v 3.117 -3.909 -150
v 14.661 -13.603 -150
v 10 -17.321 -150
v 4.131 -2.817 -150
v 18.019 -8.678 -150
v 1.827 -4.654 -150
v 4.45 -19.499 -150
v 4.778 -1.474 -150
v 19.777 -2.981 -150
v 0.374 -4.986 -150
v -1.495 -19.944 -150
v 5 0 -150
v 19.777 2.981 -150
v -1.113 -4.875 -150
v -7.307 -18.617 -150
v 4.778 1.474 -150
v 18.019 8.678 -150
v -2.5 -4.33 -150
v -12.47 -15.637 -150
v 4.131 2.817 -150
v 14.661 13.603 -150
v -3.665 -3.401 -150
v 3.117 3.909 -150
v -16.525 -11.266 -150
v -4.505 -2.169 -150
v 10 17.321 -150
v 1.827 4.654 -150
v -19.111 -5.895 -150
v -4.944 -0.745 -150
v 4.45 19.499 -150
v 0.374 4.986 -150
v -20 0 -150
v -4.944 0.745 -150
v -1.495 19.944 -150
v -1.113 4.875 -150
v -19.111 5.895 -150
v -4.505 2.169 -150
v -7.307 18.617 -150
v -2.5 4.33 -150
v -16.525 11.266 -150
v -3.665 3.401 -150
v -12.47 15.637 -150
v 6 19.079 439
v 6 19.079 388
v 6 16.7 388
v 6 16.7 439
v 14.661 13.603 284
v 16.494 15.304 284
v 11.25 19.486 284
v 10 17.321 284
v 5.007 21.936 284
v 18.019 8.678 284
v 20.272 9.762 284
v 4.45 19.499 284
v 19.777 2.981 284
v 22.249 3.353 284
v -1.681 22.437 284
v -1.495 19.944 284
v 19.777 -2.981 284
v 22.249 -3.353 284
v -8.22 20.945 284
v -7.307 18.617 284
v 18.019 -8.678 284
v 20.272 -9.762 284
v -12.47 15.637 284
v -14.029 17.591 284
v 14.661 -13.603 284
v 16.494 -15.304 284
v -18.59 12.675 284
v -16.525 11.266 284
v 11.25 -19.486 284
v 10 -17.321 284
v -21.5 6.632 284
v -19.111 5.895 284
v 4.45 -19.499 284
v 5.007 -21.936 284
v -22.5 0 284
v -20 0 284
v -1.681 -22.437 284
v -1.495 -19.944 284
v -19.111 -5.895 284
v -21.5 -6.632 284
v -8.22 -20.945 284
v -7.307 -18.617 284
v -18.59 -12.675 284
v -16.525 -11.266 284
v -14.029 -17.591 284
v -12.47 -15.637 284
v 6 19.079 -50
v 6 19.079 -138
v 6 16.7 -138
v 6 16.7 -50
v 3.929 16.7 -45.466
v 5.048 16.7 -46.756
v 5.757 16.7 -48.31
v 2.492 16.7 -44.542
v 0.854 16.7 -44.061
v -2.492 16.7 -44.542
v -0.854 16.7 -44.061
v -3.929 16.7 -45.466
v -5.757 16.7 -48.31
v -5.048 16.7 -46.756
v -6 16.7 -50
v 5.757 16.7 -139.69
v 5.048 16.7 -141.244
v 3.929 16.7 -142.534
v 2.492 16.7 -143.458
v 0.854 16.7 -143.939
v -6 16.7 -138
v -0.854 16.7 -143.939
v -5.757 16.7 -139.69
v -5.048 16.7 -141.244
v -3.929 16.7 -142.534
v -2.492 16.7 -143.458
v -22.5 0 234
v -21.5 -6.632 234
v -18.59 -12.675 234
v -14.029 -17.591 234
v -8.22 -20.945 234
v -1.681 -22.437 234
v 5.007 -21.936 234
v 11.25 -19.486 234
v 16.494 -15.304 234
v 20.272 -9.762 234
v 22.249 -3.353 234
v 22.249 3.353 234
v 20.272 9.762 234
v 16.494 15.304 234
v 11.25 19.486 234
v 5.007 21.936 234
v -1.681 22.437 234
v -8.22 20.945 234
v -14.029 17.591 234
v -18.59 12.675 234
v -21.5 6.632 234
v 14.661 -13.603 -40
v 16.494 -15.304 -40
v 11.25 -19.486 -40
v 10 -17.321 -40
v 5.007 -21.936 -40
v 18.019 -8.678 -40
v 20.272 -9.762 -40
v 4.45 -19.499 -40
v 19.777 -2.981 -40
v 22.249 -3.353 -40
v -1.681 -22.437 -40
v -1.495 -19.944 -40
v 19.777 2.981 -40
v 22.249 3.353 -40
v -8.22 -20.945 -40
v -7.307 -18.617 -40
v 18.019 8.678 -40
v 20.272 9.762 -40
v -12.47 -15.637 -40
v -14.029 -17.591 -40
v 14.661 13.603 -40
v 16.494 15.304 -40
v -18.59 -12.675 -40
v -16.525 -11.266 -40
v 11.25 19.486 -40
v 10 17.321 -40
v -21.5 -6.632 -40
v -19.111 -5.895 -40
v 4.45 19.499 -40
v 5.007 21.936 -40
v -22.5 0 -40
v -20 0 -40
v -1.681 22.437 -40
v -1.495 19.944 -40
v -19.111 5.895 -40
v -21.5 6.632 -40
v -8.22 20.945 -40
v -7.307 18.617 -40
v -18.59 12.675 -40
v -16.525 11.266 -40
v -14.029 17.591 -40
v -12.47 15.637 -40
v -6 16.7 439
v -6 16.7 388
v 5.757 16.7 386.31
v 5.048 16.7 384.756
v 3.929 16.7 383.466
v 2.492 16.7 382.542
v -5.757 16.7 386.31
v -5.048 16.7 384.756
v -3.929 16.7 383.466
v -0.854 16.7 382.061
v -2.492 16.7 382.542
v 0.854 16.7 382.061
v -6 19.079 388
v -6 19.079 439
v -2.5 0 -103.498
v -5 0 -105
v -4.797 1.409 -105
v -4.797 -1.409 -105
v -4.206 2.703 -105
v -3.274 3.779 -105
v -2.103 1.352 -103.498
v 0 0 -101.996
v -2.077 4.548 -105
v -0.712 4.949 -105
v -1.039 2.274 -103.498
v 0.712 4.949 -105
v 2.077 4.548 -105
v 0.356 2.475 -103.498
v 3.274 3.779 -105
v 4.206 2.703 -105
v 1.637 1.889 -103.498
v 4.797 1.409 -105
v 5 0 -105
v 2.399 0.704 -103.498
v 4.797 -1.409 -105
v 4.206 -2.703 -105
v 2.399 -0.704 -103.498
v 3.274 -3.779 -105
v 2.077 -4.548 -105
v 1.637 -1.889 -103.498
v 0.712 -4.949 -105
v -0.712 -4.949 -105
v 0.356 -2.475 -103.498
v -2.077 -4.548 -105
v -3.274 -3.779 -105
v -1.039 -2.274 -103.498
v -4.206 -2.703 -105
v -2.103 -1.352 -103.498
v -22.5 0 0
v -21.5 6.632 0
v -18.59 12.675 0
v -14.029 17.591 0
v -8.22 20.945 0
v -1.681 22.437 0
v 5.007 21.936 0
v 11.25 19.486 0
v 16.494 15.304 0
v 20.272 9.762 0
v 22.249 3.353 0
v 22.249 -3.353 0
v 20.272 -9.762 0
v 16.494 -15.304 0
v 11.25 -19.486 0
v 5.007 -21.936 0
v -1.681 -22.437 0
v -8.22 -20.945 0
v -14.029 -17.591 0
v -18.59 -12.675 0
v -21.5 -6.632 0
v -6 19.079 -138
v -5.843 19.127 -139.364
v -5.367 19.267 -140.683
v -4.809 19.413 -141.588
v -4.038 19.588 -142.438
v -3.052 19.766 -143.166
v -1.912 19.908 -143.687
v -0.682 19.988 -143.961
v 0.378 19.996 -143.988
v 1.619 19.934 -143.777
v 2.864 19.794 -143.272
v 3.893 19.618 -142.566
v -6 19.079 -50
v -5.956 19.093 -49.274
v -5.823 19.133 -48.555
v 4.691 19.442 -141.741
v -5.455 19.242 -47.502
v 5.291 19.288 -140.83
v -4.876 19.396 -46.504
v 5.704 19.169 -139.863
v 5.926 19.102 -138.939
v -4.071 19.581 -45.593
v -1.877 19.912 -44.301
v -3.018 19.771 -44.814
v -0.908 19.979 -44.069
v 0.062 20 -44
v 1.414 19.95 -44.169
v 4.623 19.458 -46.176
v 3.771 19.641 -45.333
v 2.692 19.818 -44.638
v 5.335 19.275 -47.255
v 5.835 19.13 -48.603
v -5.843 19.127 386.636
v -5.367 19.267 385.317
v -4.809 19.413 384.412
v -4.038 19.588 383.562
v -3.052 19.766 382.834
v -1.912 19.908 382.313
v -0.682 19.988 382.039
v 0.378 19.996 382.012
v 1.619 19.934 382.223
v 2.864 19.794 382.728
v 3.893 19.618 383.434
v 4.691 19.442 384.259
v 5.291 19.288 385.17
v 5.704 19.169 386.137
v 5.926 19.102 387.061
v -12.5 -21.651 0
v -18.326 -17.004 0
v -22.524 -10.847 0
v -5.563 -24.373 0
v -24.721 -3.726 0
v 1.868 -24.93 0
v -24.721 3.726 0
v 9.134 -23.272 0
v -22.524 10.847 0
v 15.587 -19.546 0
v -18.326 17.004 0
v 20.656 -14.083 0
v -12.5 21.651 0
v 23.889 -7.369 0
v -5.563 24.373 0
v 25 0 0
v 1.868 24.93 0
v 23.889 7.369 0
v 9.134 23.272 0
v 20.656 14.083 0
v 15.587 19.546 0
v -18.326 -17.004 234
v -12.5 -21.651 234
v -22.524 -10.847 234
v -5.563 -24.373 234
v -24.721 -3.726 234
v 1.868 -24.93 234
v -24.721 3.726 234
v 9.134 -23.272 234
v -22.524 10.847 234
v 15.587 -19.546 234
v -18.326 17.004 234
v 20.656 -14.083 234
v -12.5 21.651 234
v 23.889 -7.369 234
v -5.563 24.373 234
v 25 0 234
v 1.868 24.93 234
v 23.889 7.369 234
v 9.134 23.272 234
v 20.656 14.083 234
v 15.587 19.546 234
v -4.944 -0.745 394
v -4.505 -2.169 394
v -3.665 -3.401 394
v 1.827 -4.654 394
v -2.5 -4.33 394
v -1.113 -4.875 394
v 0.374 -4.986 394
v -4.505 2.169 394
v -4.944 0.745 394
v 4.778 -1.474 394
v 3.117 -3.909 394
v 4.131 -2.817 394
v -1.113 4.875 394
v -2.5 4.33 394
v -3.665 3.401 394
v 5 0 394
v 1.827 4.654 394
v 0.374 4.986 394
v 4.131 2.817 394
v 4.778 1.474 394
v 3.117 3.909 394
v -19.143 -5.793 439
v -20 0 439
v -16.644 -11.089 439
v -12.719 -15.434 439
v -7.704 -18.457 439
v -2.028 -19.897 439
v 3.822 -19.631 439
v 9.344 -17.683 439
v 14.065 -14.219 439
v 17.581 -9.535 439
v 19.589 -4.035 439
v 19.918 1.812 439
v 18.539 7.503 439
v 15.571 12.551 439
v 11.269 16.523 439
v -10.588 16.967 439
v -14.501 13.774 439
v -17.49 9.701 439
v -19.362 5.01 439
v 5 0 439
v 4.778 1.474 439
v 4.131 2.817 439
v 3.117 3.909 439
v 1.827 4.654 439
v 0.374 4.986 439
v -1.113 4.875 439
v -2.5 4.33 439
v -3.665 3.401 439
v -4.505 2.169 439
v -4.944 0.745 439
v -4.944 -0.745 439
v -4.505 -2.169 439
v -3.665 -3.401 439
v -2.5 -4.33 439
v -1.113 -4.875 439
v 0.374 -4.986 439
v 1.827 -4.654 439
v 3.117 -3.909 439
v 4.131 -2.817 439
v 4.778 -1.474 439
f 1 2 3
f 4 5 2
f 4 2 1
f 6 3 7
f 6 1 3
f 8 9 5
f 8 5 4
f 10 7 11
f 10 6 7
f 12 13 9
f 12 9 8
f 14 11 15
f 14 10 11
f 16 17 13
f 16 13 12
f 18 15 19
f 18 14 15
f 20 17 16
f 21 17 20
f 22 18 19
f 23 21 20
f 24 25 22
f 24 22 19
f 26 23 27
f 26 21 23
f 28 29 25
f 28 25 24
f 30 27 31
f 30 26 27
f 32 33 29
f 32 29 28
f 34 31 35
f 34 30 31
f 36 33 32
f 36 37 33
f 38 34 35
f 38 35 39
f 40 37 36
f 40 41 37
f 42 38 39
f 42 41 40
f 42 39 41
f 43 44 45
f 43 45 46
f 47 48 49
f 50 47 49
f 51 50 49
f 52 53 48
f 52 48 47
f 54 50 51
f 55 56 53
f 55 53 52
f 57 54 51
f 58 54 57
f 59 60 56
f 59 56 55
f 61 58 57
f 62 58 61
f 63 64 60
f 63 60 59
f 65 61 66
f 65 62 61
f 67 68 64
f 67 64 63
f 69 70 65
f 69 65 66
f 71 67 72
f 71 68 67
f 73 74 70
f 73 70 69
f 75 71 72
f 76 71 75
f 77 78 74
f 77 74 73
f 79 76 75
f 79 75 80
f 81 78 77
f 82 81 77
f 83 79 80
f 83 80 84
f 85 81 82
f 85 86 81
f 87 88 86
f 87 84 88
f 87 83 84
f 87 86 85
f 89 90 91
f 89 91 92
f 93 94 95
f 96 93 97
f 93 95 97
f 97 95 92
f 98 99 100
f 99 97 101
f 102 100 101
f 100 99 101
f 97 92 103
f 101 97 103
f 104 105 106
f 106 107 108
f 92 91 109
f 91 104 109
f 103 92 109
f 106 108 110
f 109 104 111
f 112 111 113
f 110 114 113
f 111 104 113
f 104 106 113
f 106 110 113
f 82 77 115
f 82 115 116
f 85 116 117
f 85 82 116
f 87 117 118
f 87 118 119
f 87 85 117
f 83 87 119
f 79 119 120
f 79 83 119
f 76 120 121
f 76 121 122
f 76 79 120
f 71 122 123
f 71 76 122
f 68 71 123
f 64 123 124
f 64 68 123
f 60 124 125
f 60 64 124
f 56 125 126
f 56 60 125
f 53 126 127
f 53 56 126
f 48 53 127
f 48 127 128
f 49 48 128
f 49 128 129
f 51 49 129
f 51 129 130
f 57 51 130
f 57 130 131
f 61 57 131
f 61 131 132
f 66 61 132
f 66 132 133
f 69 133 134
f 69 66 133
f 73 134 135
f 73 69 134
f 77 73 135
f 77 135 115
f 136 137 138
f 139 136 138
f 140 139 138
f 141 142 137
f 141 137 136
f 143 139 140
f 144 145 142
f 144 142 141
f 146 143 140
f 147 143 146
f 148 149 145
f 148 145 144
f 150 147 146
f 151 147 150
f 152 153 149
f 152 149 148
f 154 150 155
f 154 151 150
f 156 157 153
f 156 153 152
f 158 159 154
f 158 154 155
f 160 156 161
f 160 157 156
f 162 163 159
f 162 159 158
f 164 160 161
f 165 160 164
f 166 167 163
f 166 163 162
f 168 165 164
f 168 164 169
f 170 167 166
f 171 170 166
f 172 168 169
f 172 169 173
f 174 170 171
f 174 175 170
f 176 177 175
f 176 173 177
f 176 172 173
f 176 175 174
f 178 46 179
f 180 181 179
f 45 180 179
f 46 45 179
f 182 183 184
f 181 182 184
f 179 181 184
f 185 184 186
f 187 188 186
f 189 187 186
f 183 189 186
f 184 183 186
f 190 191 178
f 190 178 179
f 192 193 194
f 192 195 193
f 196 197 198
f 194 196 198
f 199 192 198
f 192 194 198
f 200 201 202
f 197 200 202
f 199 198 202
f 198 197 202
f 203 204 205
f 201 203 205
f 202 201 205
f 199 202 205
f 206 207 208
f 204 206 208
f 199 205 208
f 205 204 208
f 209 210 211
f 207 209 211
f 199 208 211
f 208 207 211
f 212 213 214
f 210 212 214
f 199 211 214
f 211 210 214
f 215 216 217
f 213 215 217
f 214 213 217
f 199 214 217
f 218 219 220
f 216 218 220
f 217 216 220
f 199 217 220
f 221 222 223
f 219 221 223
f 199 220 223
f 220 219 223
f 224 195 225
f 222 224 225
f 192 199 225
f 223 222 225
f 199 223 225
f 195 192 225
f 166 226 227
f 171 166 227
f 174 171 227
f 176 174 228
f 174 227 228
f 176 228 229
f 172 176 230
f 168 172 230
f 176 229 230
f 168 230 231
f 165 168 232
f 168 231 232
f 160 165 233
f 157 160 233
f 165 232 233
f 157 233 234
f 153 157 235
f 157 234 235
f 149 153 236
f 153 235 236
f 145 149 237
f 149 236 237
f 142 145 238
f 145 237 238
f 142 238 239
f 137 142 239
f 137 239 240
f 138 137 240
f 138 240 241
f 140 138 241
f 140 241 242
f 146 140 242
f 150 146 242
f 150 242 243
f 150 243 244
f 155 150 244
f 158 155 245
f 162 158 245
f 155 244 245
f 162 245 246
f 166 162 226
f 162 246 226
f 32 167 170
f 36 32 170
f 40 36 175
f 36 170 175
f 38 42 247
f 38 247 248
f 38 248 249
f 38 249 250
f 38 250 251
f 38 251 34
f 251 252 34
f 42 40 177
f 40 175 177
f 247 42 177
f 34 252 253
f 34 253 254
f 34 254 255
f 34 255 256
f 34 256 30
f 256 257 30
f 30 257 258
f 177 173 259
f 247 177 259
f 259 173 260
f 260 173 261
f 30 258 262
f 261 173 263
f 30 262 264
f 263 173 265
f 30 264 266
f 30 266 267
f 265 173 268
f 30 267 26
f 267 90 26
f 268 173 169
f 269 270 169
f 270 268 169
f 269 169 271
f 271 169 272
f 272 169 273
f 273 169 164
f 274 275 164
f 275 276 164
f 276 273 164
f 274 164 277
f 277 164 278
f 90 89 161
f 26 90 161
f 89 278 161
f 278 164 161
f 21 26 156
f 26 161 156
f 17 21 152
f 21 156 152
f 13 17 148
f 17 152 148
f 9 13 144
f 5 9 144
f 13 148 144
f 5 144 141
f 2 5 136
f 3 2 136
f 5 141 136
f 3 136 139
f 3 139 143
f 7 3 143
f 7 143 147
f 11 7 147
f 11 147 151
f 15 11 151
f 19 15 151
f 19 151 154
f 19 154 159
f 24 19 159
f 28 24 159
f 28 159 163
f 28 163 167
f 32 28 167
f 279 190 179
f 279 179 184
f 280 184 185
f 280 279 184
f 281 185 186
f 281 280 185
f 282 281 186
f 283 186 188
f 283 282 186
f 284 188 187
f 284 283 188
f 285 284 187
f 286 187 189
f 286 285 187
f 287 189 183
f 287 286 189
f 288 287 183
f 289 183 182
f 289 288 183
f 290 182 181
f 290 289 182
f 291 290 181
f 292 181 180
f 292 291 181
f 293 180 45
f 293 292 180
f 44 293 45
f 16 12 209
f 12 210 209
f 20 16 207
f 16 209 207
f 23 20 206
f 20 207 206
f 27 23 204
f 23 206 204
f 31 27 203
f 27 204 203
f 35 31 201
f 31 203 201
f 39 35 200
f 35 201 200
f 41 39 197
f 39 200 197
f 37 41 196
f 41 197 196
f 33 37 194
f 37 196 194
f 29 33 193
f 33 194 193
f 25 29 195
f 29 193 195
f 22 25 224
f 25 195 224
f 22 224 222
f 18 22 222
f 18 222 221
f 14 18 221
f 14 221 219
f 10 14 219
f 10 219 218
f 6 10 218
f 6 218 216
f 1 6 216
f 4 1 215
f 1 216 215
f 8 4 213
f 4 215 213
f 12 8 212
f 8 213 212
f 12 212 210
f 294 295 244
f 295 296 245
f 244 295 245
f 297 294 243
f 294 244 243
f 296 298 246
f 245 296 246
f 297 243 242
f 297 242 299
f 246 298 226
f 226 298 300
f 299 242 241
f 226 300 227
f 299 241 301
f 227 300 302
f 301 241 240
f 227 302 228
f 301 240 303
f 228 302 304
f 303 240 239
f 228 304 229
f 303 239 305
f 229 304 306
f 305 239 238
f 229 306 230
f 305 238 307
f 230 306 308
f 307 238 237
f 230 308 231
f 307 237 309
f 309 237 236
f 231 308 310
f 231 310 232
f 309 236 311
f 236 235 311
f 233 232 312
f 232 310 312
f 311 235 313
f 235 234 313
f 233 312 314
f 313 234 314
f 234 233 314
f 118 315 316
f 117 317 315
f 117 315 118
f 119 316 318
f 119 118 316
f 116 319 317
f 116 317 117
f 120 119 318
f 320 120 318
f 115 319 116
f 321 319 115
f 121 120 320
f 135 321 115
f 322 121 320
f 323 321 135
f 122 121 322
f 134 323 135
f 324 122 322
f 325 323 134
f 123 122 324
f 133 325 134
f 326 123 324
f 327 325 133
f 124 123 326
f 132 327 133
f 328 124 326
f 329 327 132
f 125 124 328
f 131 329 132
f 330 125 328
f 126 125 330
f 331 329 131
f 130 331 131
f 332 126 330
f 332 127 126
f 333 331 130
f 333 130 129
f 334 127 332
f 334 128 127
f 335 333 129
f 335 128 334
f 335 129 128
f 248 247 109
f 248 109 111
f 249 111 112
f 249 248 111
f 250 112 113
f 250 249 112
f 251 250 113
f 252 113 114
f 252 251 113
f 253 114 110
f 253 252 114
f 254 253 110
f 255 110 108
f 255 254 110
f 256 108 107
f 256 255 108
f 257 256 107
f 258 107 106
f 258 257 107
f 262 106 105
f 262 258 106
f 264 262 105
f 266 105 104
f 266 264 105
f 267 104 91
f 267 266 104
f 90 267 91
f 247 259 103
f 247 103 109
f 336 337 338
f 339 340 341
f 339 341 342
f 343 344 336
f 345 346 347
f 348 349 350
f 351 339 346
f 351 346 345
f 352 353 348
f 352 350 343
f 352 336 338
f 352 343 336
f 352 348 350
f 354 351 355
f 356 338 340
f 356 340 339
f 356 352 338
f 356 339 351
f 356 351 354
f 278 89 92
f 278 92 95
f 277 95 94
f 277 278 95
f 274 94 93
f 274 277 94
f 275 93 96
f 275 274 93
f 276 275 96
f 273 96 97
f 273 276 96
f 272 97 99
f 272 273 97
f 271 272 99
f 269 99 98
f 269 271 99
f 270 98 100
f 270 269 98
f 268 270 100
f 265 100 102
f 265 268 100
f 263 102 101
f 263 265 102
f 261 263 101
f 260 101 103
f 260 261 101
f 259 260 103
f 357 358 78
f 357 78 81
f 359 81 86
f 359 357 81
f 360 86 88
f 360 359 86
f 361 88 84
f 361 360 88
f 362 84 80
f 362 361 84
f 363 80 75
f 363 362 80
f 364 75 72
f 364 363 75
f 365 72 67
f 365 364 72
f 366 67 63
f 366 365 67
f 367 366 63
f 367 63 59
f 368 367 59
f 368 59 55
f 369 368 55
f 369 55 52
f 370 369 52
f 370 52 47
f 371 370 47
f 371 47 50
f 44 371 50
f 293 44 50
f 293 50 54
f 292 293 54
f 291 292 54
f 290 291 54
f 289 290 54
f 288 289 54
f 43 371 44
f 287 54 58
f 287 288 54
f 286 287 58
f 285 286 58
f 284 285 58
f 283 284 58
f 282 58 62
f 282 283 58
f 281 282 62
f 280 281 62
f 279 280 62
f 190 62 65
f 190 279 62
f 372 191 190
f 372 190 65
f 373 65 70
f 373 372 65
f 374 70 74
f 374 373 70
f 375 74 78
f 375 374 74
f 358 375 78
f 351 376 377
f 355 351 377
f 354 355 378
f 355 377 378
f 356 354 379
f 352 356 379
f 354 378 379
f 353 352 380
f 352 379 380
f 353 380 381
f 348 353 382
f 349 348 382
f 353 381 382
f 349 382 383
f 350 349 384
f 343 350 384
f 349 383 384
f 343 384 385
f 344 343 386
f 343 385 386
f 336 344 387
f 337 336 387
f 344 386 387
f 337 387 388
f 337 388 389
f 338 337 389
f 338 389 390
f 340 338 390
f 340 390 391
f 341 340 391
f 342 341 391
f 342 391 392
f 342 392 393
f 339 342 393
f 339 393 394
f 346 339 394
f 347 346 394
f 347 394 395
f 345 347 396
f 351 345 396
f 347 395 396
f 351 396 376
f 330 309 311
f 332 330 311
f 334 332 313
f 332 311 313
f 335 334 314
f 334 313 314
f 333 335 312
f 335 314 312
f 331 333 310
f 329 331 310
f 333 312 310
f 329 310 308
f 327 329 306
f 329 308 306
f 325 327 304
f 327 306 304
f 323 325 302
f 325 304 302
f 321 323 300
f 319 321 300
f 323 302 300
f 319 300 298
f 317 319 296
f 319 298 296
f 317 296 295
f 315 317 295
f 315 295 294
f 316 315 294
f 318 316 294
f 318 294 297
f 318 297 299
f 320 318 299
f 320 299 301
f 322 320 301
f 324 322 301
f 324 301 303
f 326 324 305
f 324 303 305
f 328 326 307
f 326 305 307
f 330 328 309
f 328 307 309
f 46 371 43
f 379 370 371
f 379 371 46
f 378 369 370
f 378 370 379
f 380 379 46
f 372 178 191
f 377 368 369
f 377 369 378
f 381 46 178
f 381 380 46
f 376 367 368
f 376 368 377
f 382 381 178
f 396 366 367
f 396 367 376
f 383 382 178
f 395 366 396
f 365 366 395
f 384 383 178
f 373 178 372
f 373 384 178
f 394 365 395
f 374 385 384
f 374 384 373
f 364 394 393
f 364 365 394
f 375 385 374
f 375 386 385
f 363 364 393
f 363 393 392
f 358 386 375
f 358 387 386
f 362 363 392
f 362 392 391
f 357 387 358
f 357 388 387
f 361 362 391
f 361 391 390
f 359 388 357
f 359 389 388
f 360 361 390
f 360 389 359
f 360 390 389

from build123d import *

# Parameters (mm, degrees)
SKETCH1_R                  = 25
BOSS_EXTRUDE1_DEPTH        = 234
SKETCH2_R                  = 22.5
BOSS_EXTRUDE2_DEPTH        = 40
SKETCH3_R                  = 20
BOSS_EXTRUDE3_DEPTH        = 110
BOSS_EXTRUDE4_START        = 50
SKETCH4_R                  = 22.5
BOSS_EXTRUDE4_DEPTH        = 50
BOSS_EXTRUDE5_START        = 155
SKETCH5_R                  = 20
BOSS_EXTRUDE5_DEPTH        = 155
CUT_EXTRUDE1_DEPTH         = 3.3
SKETCH7_R                  = 5
CUT_EXTRUDE2_DEPTH         = 45
CUT_EXTRUDE3_DEPTH         = 3.3
F_10_0MM_DOWEL_HOLE1_D     = 10
F_10_0MM_DOWEL_HOLE1_DEPTH = 45
F_10_0MM_DOWEL_HOLE1_TIP   = 3.004303095


with BuildPart() as part:
    # Sketch1 → Boss-Extrude1 (new body)
    with BuildSketch(Plane.XY):
        Circle(SKETCH1_R)
    extrude(amount=BOSS_EXTRUDE1_DEPTH)

    # Sketch2 → Boss-Extrude2 (add)
    with BuildSketch(Plane(origin=(0, 0, 0), x_dir=(-1, 0, 0), z_dir=(0, 0, -1))):
        Circle(SKETCH2_R)
    extrude(amount=BOSS_EXTRUDE2_DEPTH)

    # Sketch3 → Boss-Extrude3 (add)
    with BuildSketch(Plane(origin=(0, 0, -40), x_dir=(-1, 0, 0), z_dir=(0, 0, -1))):
        Circle(SKETCH3_R)
    extrude(amount=BOSS_EXTRUDE3_DEPTH)

    # Sketch4 → Boss-Extrude4 (add)
    with BuildSketch(Plane.XY.offset(234).offset(BOSS_EXTRUDE4_START)):
        with Locations(Location((0, 0, 0), (0, 0, 180))):
            Circle(SKETCH4_R)
    extrude(amount=-BOSS_EXTRUDE4_DEPTH)

    # Sketch5 → Boss-Extrude5 (add)
    with BuildSketch(Plane.XY.offset(284).offset(BOSS_EXTRUDE5_START)):
        with Locations(Location((0, 0, 0), (0, 0, 180))):
            Circle(SKETCH5_R)
    extrude(amount=-BOSS_EXTRUDE5_DEPTH)

    # Sketch6 → Cut-Extrude1 (cut)
    with BuildSketch(Plane(origin=(0, 20, 0), x_dir=(1, 0, 0), z_dir=(0, 1, 0))):
        with BuildLine():
            Line((-6, -439), (-6, -388))
            ThreePointArc((-6, -388), (0, -382), (6, -388))
            Line((6, -388), (6, -439))
            ThreePointArc((6, -439), (0, -445), (-6, -439))
        make_face()
    extrude(amount=-CUT_EXTRUDE1_DEPTH, mode=Mode.SUBTRACT)

    # Sketch7 → Cut-Extrude2 (cut)
    with BuildSketch(Plane.XY.offset(439)):
        Circle(SKETCH7_R)
    extrude(amount=-CUT_EXTRUDE2_DEPTH, mode=Mode.SUBTRACT)

    # Sketch8 → Cut-Extrude3 (cut)
    with BuildSketch(Plane(origin=(0, 20, 0), x_dir=(1, 0, 0), z_dir=(0, 1, 0))):
        with BuildLine():
            Line((6, 138), (6, 50))
            ThreePointArc((6, 50), (0, 44), (-6, 50))
            Line((-6, 50), (-6, 138))
            ThreePointArc((-6, 138), (0, 144), (6, 138))
        make_face()
    extrude(amount=-CUT_EXTRUDE3_DEPTH, mode=Mode.SUBTRACT)

    # Ø10.0mm Dowel Hole1
    with Locations(Plane(origin=(0, 0, -150), x_dir=(-1, 0, 0), z_dir=(0, 0, -1))):
        with Locations((0, 0)):
            Hole(F_10_0MM_DOWEL_HOLE1_D / 2, depth=F_10_0MM_DOWEL_HOLE1_DEPTH)
            with Locations((0, 0, -(F_10_0MM_DOWEL_HOLE1_DEPTH + F_10_0MM_DOWEL_HOLE1_TIP / 2))):  # 118° drill point
                Cone(0, F_10_0MM_DOWEL_HOLE1_D / 2, F_10_0MM_DOWEL_HOLE1_TIP, mode=Mode.SUBTRACT)


solid = part.part
